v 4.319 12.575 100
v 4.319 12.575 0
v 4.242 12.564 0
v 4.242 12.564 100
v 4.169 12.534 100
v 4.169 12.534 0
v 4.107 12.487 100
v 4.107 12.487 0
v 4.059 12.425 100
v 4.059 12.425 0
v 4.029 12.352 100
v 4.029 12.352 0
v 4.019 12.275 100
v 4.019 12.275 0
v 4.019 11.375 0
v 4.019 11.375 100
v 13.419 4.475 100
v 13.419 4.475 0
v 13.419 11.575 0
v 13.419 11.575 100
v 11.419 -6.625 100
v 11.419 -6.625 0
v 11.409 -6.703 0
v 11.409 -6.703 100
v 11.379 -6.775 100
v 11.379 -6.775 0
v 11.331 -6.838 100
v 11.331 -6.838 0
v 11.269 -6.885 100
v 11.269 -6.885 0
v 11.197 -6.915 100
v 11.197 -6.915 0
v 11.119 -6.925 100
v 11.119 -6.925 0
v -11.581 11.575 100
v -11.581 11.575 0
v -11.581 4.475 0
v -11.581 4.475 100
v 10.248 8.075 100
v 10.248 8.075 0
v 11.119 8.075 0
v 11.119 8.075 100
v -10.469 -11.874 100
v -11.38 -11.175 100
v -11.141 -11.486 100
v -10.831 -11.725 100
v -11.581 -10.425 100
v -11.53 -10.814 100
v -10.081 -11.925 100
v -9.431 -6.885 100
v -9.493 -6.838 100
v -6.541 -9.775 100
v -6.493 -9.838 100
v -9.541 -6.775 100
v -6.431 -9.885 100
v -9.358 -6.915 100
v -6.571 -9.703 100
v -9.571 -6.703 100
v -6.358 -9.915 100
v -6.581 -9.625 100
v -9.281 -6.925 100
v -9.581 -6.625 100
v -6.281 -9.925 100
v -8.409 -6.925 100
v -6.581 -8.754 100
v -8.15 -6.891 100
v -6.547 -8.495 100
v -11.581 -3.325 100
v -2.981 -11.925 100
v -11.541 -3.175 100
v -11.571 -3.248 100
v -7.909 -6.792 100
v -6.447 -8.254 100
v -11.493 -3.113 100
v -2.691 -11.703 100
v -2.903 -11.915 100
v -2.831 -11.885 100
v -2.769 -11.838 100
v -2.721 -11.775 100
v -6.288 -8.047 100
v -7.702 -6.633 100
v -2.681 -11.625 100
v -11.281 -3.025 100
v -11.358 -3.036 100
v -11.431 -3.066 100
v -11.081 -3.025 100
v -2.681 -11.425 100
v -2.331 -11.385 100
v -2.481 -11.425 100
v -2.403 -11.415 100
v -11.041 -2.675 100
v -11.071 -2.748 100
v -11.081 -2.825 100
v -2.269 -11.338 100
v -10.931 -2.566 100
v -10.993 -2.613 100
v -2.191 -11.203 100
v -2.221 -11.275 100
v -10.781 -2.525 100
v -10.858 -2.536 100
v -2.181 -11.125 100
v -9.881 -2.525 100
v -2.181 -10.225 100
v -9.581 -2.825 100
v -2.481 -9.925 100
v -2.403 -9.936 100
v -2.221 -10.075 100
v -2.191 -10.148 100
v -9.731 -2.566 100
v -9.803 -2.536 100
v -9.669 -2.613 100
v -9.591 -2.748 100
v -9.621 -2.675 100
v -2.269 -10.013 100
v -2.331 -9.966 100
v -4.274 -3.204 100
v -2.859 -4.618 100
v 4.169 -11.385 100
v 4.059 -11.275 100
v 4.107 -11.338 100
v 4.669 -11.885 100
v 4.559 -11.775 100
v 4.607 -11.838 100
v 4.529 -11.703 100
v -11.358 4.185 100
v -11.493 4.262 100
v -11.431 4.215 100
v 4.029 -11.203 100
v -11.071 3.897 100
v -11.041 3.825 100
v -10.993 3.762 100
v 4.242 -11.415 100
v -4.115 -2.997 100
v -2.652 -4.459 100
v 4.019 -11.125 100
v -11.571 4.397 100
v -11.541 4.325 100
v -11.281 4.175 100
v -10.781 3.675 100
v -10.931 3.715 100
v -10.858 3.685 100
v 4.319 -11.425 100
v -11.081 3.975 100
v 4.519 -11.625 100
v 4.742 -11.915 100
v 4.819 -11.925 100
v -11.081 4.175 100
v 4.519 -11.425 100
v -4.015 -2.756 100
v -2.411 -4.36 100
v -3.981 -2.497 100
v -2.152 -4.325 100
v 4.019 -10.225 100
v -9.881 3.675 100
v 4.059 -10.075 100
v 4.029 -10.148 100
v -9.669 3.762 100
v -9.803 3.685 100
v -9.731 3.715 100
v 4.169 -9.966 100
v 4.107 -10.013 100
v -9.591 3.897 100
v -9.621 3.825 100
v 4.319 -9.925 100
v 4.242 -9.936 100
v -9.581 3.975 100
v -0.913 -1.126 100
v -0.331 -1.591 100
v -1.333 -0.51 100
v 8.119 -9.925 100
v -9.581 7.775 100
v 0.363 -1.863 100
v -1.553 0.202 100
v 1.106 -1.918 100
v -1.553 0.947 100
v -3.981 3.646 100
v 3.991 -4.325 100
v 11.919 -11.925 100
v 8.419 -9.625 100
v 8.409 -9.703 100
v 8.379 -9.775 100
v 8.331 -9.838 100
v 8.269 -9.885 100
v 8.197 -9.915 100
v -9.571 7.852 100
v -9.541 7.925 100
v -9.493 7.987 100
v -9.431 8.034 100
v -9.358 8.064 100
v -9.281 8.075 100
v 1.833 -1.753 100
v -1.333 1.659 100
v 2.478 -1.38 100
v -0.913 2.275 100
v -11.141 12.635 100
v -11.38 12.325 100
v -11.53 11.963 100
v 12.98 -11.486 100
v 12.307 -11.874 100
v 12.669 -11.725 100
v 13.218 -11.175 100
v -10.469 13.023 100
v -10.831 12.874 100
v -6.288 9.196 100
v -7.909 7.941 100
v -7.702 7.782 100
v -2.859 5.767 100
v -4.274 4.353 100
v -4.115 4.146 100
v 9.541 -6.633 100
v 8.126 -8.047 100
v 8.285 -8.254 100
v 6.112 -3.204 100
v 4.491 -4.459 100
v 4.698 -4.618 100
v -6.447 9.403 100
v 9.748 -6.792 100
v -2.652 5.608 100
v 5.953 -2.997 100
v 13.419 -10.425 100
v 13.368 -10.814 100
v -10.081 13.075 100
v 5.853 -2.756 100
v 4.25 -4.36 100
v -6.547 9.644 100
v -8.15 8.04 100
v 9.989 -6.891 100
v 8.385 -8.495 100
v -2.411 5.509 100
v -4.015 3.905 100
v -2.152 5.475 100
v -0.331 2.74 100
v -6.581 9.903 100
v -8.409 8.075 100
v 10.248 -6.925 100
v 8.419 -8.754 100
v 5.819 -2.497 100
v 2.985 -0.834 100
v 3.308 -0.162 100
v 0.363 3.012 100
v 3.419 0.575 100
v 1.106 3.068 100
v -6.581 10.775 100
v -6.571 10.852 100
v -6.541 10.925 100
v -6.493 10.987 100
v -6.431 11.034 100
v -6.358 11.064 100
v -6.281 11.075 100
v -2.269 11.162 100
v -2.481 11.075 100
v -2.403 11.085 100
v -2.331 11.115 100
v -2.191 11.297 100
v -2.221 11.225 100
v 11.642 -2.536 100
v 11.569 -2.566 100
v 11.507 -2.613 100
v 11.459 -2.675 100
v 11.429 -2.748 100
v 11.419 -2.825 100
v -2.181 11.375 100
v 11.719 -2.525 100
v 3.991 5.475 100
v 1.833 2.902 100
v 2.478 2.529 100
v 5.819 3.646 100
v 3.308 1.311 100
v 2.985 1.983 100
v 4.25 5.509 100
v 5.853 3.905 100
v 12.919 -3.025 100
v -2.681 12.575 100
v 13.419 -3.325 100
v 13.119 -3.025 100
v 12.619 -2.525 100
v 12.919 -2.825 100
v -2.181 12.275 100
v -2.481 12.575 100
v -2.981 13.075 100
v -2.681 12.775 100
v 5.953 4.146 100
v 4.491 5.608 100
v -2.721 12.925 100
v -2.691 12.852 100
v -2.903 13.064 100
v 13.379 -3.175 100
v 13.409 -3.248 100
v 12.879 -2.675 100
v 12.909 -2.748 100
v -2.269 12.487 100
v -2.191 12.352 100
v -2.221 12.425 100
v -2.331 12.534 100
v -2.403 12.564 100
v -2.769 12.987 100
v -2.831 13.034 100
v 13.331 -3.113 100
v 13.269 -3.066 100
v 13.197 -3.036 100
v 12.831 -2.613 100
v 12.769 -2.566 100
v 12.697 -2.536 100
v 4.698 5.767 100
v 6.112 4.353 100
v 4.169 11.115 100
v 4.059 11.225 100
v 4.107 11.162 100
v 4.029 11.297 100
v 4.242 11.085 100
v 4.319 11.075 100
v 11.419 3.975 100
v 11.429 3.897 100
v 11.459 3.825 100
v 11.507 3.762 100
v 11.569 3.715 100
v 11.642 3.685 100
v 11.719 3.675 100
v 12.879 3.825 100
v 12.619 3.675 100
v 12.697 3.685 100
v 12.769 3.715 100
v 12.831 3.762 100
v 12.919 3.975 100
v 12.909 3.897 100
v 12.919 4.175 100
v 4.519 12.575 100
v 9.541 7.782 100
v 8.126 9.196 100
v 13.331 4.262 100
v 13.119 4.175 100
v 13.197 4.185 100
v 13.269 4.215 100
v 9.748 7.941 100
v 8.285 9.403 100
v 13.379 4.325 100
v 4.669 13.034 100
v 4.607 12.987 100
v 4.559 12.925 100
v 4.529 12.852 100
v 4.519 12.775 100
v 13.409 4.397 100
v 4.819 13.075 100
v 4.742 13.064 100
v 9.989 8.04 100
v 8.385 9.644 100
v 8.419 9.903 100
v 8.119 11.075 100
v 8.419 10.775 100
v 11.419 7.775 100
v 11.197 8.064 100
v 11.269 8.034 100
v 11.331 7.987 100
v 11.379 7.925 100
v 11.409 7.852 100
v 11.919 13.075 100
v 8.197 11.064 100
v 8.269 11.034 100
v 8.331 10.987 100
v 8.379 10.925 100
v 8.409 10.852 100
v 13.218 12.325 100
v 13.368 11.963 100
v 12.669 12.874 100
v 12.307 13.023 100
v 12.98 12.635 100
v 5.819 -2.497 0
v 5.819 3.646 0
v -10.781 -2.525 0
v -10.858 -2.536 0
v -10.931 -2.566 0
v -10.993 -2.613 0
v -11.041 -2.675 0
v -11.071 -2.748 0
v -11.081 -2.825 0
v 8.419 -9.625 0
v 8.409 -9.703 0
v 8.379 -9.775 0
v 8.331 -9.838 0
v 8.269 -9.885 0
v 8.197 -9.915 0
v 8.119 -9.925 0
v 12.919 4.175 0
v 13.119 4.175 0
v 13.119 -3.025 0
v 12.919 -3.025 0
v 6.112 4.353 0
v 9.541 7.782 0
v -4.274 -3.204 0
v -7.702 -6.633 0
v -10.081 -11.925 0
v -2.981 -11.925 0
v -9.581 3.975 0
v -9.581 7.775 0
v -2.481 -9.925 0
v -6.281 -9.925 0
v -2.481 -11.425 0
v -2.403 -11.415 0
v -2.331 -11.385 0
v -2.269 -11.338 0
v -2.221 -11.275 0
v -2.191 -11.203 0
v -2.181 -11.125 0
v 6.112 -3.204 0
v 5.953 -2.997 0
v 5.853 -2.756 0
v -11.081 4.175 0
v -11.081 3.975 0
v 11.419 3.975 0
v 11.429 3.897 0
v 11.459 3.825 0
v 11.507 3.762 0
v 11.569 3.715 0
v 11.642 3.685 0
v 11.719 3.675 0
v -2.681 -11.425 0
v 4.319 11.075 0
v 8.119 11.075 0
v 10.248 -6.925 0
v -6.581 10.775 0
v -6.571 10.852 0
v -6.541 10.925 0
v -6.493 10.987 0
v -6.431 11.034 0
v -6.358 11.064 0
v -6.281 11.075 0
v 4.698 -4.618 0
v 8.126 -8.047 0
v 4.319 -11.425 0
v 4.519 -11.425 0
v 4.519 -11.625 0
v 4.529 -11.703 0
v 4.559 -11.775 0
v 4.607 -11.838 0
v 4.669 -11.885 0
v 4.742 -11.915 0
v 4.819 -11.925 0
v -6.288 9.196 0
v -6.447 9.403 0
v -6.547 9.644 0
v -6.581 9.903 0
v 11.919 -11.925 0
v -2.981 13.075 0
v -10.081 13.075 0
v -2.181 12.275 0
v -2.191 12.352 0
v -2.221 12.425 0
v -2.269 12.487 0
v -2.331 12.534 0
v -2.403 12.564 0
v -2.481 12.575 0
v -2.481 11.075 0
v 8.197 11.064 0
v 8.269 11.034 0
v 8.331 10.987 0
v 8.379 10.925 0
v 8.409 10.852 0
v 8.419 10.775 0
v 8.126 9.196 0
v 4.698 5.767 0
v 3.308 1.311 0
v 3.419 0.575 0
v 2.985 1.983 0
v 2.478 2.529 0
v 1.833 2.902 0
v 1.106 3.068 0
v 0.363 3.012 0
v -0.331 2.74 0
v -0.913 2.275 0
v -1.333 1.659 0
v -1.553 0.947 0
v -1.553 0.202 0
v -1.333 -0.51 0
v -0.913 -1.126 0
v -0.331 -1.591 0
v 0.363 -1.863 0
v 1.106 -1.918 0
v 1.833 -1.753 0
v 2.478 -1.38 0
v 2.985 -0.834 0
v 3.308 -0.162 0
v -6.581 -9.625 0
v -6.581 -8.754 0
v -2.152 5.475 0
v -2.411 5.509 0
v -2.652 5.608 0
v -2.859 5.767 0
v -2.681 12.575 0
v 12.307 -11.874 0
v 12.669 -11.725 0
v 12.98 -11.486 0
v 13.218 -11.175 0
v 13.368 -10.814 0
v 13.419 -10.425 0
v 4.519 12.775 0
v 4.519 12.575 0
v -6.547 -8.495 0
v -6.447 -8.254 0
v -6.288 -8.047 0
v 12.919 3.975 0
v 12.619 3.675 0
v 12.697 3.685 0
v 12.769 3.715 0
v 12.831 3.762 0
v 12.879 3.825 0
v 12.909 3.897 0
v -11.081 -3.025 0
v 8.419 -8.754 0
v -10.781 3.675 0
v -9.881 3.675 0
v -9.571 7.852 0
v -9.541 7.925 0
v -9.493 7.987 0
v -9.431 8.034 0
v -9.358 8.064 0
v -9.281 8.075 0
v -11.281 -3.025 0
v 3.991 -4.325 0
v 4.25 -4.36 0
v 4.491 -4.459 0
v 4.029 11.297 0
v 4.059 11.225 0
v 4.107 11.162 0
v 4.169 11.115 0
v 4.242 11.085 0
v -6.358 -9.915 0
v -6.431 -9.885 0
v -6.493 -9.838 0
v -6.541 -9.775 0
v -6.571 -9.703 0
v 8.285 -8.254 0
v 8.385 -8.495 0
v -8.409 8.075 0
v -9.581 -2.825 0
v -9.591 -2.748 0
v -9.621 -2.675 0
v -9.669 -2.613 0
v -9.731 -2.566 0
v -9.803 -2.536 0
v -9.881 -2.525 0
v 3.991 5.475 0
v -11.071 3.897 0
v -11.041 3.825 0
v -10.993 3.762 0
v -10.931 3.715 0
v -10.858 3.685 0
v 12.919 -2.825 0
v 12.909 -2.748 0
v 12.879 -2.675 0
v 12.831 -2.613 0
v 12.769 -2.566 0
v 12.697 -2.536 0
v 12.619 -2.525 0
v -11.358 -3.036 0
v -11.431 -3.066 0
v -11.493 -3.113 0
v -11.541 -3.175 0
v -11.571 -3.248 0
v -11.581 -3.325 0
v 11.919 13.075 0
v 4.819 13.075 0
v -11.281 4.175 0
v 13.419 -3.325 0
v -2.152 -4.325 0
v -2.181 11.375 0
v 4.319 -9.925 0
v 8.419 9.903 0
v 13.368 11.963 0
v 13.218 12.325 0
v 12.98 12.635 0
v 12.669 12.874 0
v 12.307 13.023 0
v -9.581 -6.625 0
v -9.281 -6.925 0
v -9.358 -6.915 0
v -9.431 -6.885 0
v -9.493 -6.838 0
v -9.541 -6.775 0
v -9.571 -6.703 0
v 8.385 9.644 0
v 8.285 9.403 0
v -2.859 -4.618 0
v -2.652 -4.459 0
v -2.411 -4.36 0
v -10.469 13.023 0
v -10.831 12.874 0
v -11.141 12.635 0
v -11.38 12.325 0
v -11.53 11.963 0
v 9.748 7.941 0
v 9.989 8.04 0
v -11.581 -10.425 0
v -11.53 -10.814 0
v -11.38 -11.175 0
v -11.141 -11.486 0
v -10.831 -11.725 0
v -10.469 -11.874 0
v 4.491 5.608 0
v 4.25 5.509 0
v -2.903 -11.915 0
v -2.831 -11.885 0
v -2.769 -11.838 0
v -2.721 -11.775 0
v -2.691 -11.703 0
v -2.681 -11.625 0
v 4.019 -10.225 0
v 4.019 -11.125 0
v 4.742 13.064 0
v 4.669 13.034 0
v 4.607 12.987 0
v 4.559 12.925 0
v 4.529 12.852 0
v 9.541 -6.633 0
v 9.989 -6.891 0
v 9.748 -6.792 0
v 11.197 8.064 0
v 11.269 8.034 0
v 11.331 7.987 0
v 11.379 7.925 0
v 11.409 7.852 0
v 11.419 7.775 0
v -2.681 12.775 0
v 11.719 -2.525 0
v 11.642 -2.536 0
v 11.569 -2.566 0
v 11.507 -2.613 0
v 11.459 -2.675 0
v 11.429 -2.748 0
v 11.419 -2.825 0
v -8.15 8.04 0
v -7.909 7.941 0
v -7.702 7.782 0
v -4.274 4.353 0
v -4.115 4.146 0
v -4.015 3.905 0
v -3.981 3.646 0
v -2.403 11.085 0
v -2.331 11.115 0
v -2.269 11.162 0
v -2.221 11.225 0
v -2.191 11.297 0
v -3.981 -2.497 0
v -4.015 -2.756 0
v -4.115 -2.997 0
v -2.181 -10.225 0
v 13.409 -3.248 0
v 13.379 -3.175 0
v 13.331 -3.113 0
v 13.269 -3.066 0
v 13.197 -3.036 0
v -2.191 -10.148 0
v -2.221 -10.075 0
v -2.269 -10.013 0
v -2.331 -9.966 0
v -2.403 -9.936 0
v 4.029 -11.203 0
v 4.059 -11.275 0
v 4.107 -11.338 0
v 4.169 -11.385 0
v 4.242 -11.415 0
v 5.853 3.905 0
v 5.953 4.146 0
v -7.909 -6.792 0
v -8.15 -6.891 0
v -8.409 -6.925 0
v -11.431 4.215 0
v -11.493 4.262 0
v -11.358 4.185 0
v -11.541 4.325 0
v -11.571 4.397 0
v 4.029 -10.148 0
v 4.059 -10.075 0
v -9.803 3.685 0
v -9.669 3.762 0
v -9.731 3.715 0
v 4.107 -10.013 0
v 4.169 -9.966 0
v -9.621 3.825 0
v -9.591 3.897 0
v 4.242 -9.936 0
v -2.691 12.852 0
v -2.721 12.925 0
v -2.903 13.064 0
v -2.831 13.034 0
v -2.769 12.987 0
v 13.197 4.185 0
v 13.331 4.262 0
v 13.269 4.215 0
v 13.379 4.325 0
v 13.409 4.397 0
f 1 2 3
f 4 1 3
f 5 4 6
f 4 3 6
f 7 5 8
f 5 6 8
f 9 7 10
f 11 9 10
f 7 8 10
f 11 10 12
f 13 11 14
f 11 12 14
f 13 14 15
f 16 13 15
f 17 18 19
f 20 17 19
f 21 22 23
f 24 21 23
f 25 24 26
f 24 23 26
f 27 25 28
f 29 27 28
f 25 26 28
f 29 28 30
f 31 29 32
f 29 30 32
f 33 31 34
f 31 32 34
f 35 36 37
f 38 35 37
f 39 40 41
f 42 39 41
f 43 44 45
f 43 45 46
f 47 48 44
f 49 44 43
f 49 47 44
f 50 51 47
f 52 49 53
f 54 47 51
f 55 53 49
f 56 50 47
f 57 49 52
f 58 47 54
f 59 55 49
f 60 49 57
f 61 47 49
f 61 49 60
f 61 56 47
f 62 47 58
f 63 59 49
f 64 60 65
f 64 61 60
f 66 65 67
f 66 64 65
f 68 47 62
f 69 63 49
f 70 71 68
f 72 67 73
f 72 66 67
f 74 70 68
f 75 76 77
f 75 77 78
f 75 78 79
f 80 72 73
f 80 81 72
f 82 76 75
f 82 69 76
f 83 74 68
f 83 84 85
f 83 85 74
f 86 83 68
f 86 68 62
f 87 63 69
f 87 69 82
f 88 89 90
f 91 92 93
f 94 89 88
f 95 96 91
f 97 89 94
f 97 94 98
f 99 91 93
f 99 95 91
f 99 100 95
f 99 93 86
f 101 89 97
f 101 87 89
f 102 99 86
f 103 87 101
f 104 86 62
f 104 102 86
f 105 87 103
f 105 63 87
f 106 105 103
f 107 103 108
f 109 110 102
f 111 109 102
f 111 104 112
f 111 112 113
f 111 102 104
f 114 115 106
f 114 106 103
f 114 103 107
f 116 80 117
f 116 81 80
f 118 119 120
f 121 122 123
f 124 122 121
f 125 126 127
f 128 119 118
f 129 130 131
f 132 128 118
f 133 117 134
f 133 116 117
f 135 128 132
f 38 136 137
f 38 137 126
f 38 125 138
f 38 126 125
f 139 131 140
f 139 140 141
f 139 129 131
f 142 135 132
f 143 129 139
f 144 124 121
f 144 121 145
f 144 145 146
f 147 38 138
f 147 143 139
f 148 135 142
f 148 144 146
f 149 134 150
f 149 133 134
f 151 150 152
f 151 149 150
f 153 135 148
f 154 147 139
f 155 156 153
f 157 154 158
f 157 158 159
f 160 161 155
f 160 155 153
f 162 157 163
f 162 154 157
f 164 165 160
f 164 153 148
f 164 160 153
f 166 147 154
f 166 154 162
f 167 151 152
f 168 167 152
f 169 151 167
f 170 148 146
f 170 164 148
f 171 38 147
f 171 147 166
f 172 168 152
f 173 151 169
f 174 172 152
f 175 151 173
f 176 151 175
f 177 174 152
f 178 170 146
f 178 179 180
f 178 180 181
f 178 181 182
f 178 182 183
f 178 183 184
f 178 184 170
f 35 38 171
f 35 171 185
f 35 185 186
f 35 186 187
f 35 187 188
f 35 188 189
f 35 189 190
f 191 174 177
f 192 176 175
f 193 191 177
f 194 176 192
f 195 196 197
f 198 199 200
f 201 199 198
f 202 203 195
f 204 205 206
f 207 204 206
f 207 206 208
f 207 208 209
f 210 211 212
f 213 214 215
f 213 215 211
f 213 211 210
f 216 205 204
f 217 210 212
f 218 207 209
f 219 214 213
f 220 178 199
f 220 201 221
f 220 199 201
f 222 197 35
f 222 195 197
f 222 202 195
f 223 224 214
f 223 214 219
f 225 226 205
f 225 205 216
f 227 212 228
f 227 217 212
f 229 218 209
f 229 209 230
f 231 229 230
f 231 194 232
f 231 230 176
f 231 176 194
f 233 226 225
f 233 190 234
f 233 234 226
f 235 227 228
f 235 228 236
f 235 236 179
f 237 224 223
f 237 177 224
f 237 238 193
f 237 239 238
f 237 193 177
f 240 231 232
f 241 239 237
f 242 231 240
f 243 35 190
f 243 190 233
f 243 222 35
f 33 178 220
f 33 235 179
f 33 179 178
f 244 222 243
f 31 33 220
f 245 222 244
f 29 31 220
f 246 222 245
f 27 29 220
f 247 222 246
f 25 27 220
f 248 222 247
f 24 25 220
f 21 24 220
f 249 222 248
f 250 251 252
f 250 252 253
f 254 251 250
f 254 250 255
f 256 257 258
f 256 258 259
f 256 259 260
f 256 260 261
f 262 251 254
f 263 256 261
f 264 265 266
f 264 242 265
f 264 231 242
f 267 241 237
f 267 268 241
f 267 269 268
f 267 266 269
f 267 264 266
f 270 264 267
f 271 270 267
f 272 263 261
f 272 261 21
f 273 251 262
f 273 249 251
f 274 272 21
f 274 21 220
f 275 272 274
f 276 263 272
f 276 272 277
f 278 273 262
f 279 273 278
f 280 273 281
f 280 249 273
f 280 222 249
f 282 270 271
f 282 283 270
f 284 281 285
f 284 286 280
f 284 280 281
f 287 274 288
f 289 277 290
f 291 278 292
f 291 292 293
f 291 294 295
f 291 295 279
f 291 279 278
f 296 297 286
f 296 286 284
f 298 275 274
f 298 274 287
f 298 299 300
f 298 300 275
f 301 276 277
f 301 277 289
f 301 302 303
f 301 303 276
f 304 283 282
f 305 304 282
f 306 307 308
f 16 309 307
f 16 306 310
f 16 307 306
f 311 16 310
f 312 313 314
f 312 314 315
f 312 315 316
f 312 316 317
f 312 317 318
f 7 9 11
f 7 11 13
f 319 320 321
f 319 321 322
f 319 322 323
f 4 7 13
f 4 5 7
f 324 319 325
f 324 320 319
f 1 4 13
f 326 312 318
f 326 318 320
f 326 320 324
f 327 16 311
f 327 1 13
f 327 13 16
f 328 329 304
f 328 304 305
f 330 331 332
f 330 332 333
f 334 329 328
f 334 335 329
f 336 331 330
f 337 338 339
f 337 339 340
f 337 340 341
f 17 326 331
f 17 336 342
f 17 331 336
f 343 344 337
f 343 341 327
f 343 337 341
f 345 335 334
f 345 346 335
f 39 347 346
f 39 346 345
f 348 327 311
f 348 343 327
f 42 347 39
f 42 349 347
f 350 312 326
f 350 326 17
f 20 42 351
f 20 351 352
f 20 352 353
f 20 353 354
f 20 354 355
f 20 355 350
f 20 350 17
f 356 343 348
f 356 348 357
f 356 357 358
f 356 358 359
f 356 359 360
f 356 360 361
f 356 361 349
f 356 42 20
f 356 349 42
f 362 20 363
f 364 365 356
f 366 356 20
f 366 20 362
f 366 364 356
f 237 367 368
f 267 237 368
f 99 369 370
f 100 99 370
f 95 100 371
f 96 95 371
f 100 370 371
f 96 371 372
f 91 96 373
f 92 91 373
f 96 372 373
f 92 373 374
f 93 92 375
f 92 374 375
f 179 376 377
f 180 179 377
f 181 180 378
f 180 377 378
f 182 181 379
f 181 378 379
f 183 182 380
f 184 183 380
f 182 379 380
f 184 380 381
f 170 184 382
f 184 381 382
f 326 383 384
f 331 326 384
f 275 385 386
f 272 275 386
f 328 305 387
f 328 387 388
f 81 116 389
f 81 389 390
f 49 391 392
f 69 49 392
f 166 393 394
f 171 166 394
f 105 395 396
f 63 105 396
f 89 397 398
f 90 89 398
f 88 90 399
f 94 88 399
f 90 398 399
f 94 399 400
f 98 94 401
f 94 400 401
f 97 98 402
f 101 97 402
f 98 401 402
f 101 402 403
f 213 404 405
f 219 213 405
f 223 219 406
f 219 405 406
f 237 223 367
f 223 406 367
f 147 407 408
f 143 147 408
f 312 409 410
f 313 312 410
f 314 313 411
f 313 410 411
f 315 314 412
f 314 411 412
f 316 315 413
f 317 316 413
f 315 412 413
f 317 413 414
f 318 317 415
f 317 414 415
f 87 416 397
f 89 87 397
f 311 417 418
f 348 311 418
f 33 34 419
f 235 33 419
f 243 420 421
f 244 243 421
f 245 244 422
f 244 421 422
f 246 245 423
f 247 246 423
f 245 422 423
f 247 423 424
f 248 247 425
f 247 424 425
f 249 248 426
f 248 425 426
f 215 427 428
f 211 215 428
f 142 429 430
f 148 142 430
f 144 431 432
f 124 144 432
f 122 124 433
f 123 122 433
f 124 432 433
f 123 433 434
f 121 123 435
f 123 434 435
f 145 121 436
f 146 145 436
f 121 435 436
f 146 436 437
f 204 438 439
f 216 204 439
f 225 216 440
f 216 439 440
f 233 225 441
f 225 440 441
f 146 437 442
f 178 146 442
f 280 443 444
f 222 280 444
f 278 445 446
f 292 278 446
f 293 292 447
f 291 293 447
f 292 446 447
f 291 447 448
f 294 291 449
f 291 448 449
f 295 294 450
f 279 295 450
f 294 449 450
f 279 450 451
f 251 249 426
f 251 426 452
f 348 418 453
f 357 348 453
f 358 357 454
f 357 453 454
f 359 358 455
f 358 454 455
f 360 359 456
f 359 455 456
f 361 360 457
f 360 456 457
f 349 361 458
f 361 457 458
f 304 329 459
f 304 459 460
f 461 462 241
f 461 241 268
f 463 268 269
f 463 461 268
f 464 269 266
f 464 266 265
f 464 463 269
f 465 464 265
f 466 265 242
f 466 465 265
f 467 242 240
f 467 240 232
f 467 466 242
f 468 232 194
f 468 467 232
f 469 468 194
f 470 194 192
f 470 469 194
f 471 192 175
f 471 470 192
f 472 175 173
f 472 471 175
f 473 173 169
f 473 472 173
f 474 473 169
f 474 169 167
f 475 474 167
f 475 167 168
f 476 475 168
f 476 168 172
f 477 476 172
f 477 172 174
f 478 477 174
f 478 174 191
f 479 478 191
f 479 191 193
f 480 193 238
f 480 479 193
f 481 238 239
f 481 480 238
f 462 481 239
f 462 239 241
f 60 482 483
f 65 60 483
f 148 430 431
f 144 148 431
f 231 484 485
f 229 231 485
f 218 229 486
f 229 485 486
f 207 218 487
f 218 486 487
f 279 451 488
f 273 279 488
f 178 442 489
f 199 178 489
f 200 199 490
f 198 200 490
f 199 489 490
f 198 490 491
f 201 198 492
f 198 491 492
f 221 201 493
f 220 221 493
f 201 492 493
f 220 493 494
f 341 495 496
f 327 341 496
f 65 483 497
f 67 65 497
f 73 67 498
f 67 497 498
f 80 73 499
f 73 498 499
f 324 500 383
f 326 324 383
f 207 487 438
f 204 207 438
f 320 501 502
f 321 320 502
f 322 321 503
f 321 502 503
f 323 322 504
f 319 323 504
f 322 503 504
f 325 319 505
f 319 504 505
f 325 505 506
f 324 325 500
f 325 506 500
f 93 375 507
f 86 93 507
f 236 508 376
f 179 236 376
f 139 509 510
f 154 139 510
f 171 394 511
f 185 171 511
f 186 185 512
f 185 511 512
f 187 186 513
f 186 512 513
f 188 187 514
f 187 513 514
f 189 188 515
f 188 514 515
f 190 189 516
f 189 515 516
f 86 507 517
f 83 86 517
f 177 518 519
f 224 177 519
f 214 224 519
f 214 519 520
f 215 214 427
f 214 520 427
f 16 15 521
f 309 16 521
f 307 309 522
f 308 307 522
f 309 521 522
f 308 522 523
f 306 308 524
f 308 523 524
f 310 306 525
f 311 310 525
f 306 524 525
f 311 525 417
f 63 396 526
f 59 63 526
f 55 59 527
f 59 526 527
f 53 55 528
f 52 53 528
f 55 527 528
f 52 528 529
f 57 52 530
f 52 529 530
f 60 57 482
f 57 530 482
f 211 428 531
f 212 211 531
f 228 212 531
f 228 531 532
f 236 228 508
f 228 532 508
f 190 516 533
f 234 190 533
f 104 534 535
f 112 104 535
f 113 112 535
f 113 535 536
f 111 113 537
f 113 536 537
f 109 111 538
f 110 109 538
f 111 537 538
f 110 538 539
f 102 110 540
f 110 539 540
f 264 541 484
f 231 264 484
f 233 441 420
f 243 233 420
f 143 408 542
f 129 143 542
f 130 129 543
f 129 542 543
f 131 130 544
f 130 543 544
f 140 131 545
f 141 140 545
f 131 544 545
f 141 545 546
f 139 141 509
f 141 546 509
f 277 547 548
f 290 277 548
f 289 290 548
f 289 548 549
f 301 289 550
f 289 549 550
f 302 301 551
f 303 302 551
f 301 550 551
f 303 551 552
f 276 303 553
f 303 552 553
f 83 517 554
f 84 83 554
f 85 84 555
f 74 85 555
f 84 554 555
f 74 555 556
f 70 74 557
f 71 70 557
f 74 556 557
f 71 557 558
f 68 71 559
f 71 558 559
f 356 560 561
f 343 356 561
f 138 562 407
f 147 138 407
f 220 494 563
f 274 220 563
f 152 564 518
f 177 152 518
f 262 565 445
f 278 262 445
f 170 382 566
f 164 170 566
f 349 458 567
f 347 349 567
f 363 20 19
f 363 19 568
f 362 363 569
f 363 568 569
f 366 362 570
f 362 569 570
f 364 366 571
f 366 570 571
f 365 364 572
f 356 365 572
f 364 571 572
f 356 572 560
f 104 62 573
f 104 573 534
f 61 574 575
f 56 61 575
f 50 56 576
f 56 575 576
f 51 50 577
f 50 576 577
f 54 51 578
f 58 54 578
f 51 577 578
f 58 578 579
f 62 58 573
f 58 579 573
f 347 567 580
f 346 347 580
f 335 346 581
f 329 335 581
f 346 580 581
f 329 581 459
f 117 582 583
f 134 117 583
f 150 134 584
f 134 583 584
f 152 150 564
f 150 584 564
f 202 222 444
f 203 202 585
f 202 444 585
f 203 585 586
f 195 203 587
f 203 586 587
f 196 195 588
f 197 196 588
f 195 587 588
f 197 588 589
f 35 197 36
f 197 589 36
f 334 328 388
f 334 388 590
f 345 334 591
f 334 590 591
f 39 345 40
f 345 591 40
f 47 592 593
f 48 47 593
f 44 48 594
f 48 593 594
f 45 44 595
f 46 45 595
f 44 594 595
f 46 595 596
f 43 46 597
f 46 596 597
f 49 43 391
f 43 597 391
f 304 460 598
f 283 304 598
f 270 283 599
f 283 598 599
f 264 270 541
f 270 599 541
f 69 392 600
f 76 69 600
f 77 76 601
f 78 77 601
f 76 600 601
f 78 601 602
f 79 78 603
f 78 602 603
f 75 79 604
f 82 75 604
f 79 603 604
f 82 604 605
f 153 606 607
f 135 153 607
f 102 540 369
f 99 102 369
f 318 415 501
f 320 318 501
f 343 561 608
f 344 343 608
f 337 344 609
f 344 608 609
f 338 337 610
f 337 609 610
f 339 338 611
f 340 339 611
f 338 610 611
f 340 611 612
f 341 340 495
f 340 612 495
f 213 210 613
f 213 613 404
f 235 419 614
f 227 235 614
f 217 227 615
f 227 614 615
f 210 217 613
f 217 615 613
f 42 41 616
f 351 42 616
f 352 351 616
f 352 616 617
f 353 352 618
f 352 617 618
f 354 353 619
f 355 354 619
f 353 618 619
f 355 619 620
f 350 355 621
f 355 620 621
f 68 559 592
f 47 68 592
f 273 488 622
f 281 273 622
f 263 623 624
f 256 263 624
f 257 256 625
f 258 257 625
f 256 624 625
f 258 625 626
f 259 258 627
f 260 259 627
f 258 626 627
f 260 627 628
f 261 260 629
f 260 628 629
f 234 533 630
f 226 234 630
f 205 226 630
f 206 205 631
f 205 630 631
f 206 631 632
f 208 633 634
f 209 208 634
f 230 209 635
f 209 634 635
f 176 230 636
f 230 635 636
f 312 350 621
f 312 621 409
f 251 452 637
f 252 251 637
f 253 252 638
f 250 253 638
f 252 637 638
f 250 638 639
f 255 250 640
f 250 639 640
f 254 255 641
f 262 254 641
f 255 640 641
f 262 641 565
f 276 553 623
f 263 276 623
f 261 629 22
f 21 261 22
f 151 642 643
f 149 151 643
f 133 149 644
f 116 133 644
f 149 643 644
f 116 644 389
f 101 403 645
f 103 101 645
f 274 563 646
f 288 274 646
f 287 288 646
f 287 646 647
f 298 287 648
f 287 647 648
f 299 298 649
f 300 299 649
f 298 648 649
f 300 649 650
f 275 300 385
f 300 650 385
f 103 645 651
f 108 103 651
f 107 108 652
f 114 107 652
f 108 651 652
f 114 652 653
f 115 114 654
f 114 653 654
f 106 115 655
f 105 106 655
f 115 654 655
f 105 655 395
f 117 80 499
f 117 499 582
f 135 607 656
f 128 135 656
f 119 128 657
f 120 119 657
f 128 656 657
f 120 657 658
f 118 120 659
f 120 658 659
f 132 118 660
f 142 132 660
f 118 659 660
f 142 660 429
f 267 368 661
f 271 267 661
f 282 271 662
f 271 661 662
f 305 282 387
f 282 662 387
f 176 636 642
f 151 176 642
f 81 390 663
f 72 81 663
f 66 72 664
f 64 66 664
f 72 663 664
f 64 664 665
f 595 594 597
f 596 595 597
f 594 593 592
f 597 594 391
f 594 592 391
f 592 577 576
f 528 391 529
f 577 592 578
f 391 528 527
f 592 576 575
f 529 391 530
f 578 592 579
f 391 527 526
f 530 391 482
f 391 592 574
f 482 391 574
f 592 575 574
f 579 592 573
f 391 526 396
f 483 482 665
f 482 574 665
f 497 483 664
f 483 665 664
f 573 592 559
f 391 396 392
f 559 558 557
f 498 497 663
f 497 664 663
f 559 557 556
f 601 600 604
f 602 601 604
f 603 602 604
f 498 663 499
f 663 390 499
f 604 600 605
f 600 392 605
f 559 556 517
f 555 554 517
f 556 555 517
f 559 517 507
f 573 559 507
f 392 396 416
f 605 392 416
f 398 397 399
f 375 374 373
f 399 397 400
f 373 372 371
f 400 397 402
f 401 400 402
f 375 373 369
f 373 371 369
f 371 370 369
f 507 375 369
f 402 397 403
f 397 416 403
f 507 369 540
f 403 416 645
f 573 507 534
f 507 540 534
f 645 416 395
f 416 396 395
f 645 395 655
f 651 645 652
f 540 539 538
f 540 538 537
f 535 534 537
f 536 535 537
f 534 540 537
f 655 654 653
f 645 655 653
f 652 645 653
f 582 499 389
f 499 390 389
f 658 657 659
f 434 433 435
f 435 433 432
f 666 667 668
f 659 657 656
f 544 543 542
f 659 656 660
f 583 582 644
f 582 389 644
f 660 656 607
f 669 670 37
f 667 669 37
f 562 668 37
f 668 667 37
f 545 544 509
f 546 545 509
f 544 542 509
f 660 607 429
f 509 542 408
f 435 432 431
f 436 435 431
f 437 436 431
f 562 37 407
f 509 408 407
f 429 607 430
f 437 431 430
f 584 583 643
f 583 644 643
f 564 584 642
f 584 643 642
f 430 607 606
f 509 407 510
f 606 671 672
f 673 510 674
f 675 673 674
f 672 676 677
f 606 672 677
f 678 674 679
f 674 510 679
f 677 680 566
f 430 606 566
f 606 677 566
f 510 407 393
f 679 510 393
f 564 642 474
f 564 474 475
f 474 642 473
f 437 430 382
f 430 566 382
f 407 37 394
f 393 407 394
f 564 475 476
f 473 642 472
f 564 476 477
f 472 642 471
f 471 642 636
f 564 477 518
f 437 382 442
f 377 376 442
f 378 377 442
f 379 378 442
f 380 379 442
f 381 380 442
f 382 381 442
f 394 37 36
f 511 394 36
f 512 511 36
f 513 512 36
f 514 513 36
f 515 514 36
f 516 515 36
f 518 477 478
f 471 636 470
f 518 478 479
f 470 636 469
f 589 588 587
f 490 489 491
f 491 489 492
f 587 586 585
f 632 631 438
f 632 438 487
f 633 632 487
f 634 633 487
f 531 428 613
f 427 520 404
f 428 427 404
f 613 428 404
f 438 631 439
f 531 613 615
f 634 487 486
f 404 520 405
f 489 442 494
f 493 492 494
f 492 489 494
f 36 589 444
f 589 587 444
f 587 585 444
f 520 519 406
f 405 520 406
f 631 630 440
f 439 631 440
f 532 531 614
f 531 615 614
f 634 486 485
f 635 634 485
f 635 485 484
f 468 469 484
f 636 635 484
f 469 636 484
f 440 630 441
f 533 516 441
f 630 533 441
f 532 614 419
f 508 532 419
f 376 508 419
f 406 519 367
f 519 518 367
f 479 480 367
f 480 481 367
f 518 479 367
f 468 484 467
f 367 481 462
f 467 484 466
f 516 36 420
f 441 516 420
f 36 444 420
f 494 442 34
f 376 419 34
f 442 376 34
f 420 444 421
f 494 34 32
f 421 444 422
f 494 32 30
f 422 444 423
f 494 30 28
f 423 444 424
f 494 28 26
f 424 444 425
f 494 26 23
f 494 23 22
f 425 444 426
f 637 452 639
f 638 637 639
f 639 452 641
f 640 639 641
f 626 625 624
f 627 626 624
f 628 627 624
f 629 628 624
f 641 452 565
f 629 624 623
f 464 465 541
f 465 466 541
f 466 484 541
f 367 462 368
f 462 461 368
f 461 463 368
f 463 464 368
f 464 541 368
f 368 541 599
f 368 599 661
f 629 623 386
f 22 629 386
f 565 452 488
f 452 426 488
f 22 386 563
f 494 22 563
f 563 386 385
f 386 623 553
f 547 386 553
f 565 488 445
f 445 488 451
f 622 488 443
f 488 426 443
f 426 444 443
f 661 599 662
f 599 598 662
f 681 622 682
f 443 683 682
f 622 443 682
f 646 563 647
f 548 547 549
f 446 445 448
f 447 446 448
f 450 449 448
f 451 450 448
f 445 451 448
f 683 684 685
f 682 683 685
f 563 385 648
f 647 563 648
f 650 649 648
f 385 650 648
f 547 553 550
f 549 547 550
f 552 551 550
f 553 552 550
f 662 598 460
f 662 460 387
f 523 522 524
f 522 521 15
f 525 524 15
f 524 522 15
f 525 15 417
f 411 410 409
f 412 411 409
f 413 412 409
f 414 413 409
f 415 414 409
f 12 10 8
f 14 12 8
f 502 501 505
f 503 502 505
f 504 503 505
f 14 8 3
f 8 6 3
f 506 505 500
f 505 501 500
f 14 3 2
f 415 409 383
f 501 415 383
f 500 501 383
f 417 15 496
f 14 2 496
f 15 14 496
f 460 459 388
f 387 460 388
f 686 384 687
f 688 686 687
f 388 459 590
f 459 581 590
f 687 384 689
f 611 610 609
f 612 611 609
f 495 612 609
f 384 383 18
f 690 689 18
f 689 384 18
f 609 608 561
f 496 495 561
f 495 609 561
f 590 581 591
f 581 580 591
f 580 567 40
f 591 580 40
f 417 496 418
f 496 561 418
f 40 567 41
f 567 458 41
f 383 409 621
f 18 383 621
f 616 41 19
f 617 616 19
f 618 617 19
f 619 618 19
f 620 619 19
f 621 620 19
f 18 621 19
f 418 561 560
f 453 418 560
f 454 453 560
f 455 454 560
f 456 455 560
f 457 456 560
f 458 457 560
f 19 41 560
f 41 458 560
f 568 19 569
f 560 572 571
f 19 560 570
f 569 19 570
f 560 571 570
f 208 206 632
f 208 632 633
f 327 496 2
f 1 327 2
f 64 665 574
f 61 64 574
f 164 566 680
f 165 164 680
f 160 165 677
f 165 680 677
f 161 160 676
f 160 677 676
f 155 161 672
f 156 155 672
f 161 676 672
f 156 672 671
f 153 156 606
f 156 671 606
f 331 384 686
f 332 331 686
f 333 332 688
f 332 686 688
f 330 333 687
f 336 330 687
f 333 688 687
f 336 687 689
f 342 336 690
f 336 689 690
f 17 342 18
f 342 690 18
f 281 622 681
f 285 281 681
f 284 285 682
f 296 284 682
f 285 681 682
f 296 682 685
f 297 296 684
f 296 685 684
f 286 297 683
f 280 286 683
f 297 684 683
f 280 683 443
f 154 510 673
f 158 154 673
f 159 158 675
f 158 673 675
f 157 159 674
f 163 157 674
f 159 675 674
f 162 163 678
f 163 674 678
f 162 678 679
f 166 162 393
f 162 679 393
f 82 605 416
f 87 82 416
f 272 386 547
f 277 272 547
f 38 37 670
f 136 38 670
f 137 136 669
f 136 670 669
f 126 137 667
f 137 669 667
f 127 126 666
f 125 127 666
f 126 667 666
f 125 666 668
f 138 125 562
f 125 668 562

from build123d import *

# Parameters (mm, degrees)
SKETCH_1_R      = 2.5
EXTRUDE_1_DEPTH = 100


with BuildPart() as part:
    # 草图1 → 凸台-拉伸1 (new body)
    with BuildSketch(Plane.XY):
        with BuildLine():
            Line((-11.580766307, 11.574521058), (-11.580766307, 4.474521058))
            ThreePointArc((-11.580766307, 4.474521058), (-11.492898341, 4.262389024), (-11.280766307, 4.174521058))
            Line((-11.280766307, 4.174521058), (-11.080766307, 4.174521058))
            Line((-11.080766307, 4.174521058), (-11.080766307, 3.974521058))
            ThreePointArc((-11.080766307, 3.974521058), (-10.992898341, 3.762389024), (-10.780766307, 3.674521058))
            Line((-10.780766307, 3.674521058), (-9.880766307, 3.674521058))
            ThreePointArc((-9.880766307, 3.674521058), (-9.668634272, 3.762389024), (-9.580766307, 3.974521058))
            Line((-9.580766307, 3.974521058), (-9.580766307, 7.774521058))
            ThreePointArc((-9.580766307, 7.774521058), (-9.492898341, 7.986653093), (-9.280766307, 8.074521058))
            Line((-9.280766307, 8.074521058), (-8.409193431, 8.074521058))
            ThreePointArc((-8.409193431, 8.074521058), (-8.026509999, 7.998400591), (-7.70208665, 7.78162784))
            Line((-7.70208665, 7.78162784), (-4.273659525, 4.353200715))
            ThreePointArc((-4.273659525, 4.353200715), (-4.056886774, 4.028777366), (-3.980766307, 3.646093934))
            Line((-3.980766307, 3.646093934), (-3.980766307, -2.497051817))
            ThreePointArc((-3.980766307, -2.497051817), (-4.056886774, -2.879735249), (-4.273659525, -3.204158598))
            Line((-4.273659525, -3.204158598), (-7.70208665, -6.632585723))
            ThreePointArc((-7.70208665, -6.632585723), (-8.026509999, -6.849358474), (-8.409193431, -6.925478942))
            Line((-8.409193431, -6.925478942), (-9.280766307, -6.925478942))
            ThreePointArc((-9.280766307, -6.925478942), (-9.492898341, -6.837610976), (-9.580766307, -6.625478942))
            Line((-9.580766307, -6.625478942), (-9.580766307, -2.825478942))
            ThreePointArc((-9.580766307, -2.825478942), (-9.668634272, -2.613346907), (-9.880766307, -2.525478942))
            Line((-9.880766307, -2.525478942), (-10.780766307, -2.525478942))
            ThreePointArc((-10.780766307, -2.525478942), (-10.992898341, -2.613346907), (-11.080766307, -2.825478942))
            Line((-11.080766307, -2.825478942), (-11.080766307, -3.025478942))
            Line((-11.080766307, -3.025478942), (-11.280766307, -3.025478942))
            ThreePointArc((-11.280766307, -3.025478942), (-11.492898341, -3.113346907), (-11.580766307, -3.325478942))
            Line((-11.580766307, -3.325478942), (-11.580766307, -10.425478942))
            ThreePointArc((-11.580766307, -10.425478942), (-11.141426478, -11.486139113), (-10.080766307, -11.925478942))
            Line((-10.080766307, -11.925478942), (-2.980766307, -11.925478942))
            ThreePointArc((-2.980766307, -11.925478942), (-2.768634272, -11.837610976), (-2.680766307, -11.625478942))
            Line((-2.680766307, -11.625478942), (-2.680766307, -11.425478942))
            Line((-2.680766307, -11.425478942), (-2.480766307, -11.425478942))
            ThreePointArc((-2.480766307, -11.425478942), (-2.268634272, -11.337610976), (-2.180766307, -11.125478942))
            Line((-2.180766307, -11.125478942), (-2.180766307, -10.225478942))
            ThreePointArc((-2.180766307, -10.225478942), (-2.268634272, -10.013346907), (-2.480766307, -9.925478942))
            Line((-2.480766307, -9.925478942), (-6.280766307, -9.925478942))
            ThreePointArc((-6.280766307, -9.925478942), (-6.492898341, -9.837610976), (-6.580766307, -9.625478942))
            Line((-6.580766307, -9.625478942), (-6.580766307, -8.753906066))
            ThreePointArc((-6.580766307, -8.753906066), (-6.504645839, -8.371222634), (-6.287873088, -8.046799285))
            Line((-6.287873088, -8.046799285), (-2.859445963, -4.61837216))
            ThreePointArc((-2.859445963, -4.61837216), (-2.535022614, -4.401599409), (-2.152339182, -4.325478942))
            Line((-2.152339182, -4.325478942), (3.990806569, -4.325478942))
            ThreePointArc((3.990806569, -4.325478942), (4.373490001, -4.401599409), (4.69791335, -4.61837216))
            Line((4.69791335, -4.61837216), (8.126340475, -8.046799285))
            ThreePointArc((8.126340475, -8.046799285), (8.343113226, -8.371222634), (8.419233693, -8.753906066))
            Line((8.419233693, -8.753906066), (8.419233693, -9.625478942))
            ThreePointArc((8.419233693, -9.625478942), (8.331365728, -9.837610976), (8.119233693, -9.925478942))
            Line((8.119233693, -9.925478942), (4.319233693, -9.925478942))
            ThreePointArc((4.319233693, -9.925478942), (4.107101659, -10.013346907), (4.019233693, -10.225478942))
            Line((4.019233693, -10.225478942), (4.019233693, -11.125478942))
            ThreePointArc((4.019233693, -11.125478942), (4.107101659, -11.337610976), (4.319233693, -11.425478942))
            Line((4.319233693, -11.425478942), (4.519233693, -11.425478942))
            Line((4.519233693, -11.425478942), (4.519233693, -11.625478942))
            ThreePointArc((4.519233693, -11.625478942), (4.607101659, -11.837610976), (4.819233693, -11.925478942))
            Line((4.819233693, -11.925478942), (11.919233693, -11.925478942))
            ThreePointArc((11.919233693, -11.925478942), (12.979893865, -11.486139113), (13.419233693, -10.425478942))
            Line((13.419233693, -10.425478942), (13.419233693, -3.325478942))
            ThreePointArc((13.419233693, -3.325478942), (13.331365728, -3.113346907), (13.119233693, -3.025478942))
            Line((13.119233693, -3.025478942), (12.919233693, -3.025478942))
            Line((12.919233693, -3.025478942), (12.919233693, -2.825478942))
            ThreePointArc((12.919233693, -2.825478942), (12.831365728, -2.613346907), (12.619233693, -2.525478942))
            Line((12.619233693, -2.525478942), (11.719233693, -2.525478942))
            ThreePointArc((11.719233693, -2.525478942), (11.507101659, -2.613346907), (11.419233693, -2.825478942))
            Line((11.419233693, -2.825478942), (11.419233693, -6.625478942))
            ThreePointArc((11.419233693, -6.625478942), (11.331365728, -6.837610976), (11.119233693, -6.925478942))
            Line((11.119233693, -6.925478942), (10.247660818, -6.925478942))
            ThreePointArc((10.247660818, -6.925478942), (9.864977386, -6.849358474), (9.540554037, -6.632585723))
            Line((9.540554037, -6.632585723), (6.112126912, -3.204158598))
            ThreePointArc((6.112126912, -3.204158598), (5.895354161, -2.879735249), (5.819233693, -2.497051817))
            Line((5.819233693, -2.497051817), (5.819233693, 3.646093934))
            ThreePointArc((5.819233693, 3.646093934), (5.895354161, 4.028777366), (6.112126912, 4.353200715))
            Line((6.112126912, 4.353200715), (9.540554037, 7.78162784))
            ThreePointArc((9.540554037, 7.78162784), (9.864977386, 7.998400591), (10.247660818, 8.074521058))
            Line((10.247660818, 8.074521058), (11.119233693, 8.074521058))
            ThreePointArc((11.119233693, 8.074521058), (11.331365728, 7.986653093), (11.419233693, 7.774521058))
            Line((11.419233693, 7.774521058), (11.419233693, 3.974521058))
            ThreePointArc((11.419233693, 3.974521058), (11.507101659, 3.762389024), (11.719233693, 3.674521058))
            Line((11.719233693, 3.674521058), (12.619233693, 3.674521058))
            ThreePointArc((12.619233693, 3.674521058), (12.831365728, 3.762389024), (12.919233693, 3.974521058))
            Line((12.919233693, 3.974521058), (12.919233693, 4.174521058))
            Line((12.919233693, 4.174521058), (13.119233693, 4.174521058))
            ThreePointArc((13.119233693, 4.174521058), (13.331365728, 4.262389024), (13.419233693, 4.474521058))
            Line((13.419233693, 4.474521058), (13.419233693, 11.574521058))
            ThreePointArc((13.419233693, 11.574521058), (12.979893865, 12.63518123), (11.919233693, 13.074521058))
            Line((11.919233693, 13.074521058), (4.819233693, 13.074521058))
            ThreePointArc((4.819233693, 13.074521058), (4.607101659, 12.986653093), (4.519233693, 12.774521058))
            Line((4.519233693, 12.774521058), (4.519233693, 12.574521058))
            Line((4.519233693, 12.574521058), (4.319233693, 12.574521058))
            ThreePointArc((4.319233693, 12.574521058), (4.107101659, 12.486653093), (4.019233693, 12.274521058))
            Line((4.019233693, 12.274521058), (4.019233693, 11.374521058))
            ThreePointArc((4.019233693, 11.374521058), (4.107101659, 11.162389024), (4.319233693, 11.074521058))
            Line((4.319233693, 11.074521058), (8.119233693, 11.074521058))
            ThreePointArc((8.119233693, 11.074521058), (8.331365728, 10.986653093), (8.419233693, 10.774521058))
            Line((8.419233693, 10.774521058), (8.419233693, 9.902948183))
            ThreePointArc((8.419233693, 9.902948183), (8.343113226, 9.520264751), (8.126340475, 9.195841402))
            Line((8.126340475, 9.195841402), (4.69791335, 5.767414277))
            ThreePointArc((4.69791335, 5.767414277), (4.373490001, 5.550641526), (3.990806569, 5.474521058))
            Line((3.990806569, 5.474521058), (-2.152339182, 5.474521058))
            ThreePointArc((-2.152339182, 5.474521058), (-2.535022614, 5.550641526), (-2.859445963, 5.767414277))
            Line((-2.859445963, 5.767414277), (-6.287873088, 9.195841402))
            ThreePointArc((-6.287873088, 9.195841402), (-6.504645839, 9.520264751), (-6.580766307, 9.902948183))
            Line((-6.580766307, 9.902948183), (-6.580766307, 10.774521058))
            ThreePointArc((-6.580766307, 10.774521058), (-6.492898341, 10.986653093), (-6.280766307, 11.074521058))
            Line((-6.280766307, 11.074521058), (-2.480766307, 11.074521058))
            ThreePointArc((-2.480766307, 11.074521058), (-2.268634272, 11.162389024), (-2.180766307, 11.374521058))
            Line((-2.180766307, 11.374521058), (-2.180766307, 12.274521058))
            ThreePointArc((-2.180766307, 12.274521058), (-2.268634272, 12.486653093), (-2.480766307, 12.574521058))
            Line((-2.480766307, 12.574521058), (-2.680766307, 12.574521058))
            Line((-2.680766307, 12.574521058), (-2.680766307, 12.774521058))
            ThreePointArc((-2.680766307, 12.774521058), (-2.768634272, 12.986653093), (-2.980766307, 13.074521058))
            Line((-2.980766307, 13.074521058), (-10.080766307, 13.074521058))
            ThreePointArc((-10.080766307, 13.074521058), (-11.141426478, 12.63518123), (-11.580766307, 11.574521058))
        make_face()
        with Locations((0.919233693, 0.574521058)):
            Circle(SKETCH_1_R, mode=Mode.SUBTRACT)
    extrude(amount=EXTRUDE_1_DEPTH)


solid = part.part
